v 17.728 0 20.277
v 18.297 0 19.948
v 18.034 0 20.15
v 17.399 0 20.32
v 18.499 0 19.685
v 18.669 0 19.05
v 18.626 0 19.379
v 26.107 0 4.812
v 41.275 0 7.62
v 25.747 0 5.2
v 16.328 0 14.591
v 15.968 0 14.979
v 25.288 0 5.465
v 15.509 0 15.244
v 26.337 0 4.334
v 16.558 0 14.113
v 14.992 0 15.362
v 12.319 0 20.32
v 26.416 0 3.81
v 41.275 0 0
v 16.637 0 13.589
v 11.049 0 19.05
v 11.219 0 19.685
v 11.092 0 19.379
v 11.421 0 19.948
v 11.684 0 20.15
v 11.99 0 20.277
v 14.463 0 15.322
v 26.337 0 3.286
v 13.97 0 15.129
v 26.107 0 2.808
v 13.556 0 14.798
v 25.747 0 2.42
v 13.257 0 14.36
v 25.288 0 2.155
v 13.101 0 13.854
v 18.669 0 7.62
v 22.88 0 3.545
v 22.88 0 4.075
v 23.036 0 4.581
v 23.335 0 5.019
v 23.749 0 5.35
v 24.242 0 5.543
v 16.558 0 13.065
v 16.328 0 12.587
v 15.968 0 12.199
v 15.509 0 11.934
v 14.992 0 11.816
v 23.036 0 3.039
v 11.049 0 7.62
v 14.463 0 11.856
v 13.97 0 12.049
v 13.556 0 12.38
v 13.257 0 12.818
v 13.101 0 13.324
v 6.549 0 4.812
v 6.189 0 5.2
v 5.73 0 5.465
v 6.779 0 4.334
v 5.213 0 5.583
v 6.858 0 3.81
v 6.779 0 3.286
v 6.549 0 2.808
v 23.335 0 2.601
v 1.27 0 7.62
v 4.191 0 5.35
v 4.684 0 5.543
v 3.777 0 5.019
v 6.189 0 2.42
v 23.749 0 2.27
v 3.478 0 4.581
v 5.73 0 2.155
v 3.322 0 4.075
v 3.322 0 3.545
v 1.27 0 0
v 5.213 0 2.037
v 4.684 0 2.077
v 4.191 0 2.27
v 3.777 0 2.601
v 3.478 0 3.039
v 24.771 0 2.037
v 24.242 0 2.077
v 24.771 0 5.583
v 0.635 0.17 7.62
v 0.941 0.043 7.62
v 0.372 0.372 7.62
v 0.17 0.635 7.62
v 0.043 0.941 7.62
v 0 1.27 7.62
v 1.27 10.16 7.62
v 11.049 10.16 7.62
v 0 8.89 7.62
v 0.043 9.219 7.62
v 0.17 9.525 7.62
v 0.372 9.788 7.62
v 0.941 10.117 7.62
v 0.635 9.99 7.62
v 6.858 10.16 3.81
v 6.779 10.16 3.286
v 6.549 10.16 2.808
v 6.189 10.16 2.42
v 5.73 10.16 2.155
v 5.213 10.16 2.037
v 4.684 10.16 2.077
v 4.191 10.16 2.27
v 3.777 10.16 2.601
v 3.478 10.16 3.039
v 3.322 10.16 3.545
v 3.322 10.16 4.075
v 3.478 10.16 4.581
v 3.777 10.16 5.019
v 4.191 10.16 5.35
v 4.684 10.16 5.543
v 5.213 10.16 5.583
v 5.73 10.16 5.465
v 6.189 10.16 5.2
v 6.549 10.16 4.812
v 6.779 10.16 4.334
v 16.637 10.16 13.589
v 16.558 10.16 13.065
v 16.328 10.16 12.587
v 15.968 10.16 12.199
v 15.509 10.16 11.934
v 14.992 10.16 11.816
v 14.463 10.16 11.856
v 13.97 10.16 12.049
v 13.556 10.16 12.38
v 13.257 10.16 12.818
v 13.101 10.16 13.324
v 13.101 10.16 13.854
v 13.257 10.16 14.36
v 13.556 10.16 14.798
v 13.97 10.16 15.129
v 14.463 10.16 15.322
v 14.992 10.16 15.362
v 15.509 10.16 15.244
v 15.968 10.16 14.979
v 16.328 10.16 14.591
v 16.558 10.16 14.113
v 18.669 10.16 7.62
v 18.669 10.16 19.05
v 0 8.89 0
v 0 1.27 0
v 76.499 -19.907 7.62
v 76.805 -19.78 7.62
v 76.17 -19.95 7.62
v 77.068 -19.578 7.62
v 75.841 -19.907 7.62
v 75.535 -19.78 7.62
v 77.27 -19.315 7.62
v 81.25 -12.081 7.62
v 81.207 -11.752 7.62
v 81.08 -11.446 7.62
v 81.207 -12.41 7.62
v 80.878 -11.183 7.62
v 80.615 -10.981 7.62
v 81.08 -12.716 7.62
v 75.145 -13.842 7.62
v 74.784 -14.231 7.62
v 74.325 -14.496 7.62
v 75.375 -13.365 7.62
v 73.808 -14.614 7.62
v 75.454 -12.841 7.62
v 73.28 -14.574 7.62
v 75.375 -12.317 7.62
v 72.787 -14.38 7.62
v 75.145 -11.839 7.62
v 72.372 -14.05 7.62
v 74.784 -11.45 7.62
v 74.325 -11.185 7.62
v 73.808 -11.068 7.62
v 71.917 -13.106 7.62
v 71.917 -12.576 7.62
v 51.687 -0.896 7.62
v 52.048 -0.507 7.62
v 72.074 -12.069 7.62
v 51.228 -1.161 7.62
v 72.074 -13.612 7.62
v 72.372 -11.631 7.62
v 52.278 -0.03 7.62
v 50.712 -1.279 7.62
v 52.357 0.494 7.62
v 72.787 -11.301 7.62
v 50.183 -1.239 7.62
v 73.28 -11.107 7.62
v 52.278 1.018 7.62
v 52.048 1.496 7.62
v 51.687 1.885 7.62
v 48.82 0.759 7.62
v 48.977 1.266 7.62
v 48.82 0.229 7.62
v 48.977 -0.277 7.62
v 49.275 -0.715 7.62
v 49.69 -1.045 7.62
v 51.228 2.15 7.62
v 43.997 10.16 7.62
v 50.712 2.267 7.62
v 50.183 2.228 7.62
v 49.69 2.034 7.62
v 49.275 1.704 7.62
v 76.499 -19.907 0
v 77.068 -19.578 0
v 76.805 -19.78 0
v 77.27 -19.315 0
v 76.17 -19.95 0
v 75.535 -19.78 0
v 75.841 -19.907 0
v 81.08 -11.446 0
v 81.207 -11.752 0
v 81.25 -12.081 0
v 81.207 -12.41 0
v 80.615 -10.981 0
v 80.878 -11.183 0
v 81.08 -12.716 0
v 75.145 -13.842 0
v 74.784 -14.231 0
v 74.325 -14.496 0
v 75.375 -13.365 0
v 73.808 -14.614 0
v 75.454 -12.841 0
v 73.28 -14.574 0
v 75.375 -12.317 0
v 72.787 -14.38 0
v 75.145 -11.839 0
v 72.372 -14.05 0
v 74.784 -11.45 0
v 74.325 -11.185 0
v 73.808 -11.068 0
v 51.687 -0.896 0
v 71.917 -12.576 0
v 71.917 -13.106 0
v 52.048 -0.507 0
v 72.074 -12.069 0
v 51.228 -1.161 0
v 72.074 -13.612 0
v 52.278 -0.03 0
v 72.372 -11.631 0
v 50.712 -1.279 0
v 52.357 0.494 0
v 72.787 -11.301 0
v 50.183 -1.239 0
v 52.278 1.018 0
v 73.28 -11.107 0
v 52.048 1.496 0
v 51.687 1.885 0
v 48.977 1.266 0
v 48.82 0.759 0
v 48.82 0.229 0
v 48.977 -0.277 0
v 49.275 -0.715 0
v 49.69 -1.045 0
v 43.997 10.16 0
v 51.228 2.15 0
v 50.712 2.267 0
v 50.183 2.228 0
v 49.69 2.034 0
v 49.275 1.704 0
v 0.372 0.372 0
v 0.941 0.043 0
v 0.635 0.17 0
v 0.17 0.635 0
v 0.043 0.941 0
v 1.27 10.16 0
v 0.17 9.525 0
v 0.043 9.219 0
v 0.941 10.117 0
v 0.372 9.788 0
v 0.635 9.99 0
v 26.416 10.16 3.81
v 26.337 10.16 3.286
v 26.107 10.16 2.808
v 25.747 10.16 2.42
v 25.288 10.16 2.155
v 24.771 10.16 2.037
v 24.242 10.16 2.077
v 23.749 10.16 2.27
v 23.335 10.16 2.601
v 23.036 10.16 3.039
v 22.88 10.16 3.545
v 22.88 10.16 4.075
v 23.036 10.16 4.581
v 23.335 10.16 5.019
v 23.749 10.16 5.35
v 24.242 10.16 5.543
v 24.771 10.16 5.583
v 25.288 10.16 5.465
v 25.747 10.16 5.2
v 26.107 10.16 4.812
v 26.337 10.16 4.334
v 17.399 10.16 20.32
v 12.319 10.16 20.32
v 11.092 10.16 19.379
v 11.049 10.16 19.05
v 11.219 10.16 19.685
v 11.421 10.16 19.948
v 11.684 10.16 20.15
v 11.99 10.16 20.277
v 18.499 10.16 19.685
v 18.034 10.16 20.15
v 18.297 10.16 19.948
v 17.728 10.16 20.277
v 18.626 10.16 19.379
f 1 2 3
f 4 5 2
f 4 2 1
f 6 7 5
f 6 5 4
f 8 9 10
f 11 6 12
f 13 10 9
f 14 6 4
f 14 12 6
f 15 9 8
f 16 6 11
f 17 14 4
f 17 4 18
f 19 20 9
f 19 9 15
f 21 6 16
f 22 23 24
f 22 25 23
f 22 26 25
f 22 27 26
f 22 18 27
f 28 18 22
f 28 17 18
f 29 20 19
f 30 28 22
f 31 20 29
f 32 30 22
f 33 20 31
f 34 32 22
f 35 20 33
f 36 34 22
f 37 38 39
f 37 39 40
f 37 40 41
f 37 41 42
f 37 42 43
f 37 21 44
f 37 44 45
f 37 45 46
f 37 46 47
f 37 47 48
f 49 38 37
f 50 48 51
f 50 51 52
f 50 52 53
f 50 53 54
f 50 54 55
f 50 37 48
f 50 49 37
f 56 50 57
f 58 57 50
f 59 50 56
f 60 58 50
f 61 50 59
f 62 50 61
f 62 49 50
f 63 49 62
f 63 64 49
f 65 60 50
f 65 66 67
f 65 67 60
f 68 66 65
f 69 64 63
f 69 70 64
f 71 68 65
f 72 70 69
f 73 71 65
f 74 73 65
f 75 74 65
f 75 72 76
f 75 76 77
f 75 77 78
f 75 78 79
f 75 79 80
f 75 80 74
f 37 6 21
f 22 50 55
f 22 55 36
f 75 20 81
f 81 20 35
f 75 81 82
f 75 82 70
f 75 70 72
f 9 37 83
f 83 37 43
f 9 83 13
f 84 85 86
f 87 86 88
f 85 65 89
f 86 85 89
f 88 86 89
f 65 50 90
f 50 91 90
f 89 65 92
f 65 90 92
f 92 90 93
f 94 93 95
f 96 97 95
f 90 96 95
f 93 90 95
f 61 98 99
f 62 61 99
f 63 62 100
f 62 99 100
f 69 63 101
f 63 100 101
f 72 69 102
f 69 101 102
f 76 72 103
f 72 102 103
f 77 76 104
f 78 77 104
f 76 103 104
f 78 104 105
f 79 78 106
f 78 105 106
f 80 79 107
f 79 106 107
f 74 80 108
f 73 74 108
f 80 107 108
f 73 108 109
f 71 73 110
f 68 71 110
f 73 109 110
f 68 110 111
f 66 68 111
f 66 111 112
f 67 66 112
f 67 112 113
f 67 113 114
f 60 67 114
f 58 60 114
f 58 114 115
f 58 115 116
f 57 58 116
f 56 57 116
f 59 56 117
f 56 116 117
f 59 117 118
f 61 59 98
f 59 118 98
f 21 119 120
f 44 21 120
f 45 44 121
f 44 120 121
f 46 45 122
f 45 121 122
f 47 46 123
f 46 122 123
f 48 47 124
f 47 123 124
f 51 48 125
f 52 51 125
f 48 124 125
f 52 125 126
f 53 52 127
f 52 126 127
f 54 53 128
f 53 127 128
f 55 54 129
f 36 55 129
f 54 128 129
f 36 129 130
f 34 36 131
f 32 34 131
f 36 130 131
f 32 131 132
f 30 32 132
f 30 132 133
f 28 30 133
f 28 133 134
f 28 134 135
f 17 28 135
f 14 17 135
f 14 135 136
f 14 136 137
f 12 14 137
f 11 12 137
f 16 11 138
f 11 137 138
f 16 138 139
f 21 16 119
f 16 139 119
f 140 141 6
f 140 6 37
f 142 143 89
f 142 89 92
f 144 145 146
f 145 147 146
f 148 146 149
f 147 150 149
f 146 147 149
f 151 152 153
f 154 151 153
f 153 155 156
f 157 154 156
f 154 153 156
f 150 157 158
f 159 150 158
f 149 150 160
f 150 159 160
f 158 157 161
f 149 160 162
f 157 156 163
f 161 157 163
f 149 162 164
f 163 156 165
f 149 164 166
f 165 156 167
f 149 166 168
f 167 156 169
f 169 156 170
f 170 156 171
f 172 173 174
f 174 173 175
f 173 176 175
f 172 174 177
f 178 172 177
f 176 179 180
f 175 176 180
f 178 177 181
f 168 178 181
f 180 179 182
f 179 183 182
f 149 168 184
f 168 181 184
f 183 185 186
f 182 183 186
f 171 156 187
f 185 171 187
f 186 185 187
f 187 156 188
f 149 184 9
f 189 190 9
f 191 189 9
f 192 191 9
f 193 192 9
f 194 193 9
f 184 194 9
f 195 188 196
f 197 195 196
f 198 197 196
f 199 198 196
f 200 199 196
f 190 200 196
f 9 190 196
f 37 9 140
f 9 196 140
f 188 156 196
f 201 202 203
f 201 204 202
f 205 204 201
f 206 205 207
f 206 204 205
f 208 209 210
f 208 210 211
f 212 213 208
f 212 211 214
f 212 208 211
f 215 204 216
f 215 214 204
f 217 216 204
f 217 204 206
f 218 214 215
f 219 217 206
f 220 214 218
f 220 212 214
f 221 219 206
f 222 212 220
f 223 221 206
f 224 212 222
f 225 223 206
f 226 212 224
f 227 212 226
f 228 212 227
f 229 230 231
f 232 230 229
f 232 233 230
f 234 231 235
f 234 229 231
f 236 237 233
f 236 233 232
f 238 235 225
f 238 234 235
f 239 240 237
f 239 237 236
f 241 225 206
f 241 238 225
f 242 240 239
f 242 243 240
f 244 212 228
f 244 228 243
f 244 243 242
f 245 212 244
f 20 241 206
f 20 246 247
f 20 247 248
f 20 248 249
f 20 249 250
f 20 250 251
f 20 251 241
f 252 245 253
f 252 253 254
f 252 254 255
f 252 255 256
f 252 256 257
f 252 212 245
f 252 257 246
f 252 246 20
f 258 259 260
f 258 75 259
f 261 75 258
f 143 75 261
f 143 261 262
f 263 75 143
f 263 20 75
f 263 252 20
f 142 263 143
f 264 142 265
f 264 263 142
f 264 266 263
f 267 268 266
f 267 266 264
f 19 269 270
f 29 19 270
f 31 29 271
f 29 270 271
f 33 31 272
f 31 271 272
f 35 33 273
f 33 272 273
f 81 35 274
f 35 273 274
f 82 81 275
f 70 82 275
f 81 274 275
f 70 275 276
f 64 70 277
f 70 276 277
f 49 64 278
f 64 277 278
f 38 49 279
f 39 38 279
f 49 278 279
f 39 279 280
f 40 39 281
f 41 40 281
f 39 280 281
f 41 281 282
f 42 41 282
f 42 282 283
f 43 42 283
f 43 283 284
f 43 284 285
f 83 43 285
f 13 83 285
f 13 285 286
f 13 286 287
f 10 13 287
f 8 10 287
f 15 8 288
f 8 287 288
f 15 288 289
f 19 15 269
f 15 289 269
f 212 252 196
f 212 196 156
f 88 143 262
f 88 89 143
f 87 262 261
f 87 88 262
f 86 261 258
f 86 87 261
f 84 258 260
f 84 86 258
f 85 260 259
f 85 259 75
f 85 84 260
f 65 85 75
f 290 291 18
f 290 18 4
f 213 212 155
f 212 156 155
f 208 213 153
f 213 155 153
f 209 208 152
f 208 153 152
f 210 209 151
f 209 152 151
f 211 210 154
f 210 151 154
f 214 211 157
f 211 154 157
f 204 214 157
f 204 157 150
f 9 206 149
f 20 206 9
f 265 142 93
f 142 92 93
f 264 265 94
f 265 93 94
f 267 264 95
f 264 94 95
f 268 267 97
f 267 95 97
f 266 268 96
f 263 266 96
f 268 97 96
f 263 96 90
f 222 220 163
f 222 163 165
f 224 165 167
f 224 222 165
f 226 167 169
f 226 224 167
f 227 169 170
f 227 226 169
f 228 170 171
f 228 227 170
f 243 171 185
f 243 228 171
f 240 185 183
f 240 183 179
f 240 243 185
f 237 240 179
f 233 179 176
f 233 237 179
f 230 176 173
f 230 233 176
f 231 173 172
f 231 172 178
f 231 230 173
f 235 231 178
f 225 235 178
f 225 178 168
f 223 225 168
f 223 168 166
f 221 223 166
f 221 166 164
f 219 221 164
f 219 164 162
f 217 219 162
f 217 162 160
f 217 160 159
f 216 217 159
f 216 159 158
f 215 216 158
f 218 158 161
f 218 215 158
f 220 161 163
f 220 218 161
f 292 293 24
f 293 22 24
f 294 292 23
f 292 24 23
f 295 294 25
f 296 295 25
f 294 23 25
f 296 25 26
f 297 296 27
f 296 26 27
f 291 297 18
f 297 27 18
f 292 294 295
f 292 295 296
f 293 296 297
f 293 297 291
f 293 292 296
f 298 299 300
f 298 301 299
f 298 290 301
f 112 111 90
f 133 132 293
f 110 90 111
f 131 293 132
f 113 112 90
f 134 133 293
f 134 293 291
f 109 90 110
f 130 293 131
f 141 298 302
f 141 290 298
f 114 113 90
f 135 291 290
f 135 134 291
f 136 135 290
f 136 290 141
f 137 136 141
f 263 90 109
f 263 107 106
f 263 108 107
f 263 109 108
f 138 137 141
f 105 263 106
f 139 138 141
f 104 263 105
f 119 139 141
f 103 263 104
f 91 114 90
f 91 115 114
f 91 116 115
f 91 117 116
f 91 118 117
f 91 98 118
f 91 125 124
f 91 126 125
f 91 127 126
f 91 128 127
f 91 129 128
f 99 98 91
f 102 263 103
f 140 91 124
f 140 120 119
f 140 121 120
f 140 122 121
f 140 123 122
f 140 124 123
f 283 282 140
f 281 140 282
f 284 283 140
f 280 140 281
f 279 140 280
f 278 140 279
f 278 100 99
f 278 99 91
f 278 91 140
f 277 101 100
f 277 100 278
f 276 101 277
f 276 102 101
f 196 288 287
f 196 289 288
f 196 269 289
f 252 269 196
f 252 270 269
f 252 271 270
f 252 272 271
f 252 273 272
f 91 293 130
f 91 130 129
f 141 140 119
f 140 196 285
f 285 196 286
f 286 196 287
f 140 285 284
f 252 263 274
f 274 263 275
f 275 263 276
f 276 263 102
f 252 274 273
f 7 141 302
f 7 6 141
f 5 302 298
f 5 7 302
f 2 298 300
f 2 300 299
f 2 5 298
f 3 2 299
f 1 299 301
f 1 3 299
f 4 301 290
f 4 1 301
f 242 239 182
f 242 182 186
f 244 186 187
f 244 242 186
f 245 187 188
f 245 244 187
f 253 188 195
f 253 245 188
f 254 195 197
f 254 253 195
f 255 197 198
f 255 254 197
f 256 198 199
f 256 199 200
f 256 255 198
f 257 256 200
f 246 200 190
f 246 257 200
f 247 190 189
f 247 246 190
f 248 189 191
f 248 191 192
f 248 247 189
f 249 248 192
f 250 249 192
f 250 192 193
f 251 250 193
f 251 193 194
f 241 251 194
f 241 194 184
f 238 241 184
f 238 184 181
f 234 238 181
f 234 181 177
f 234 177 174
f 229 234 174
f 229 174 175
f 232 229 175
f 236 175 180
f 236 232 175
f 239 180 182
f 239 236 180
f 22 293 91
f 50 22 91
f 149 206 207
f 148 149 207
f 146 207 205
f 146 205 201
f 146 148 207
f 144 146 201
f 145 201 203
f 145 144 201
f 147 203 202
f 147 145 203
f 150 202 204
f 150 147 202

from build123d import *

# Parameters (mm, degrees)
SKETCH1_R           = 1.778
BOSS_EXTRUDE1_DEPTH = 7.62
SKETCH2_R           = 1.778
CUT_EXTRUDE1_DEPTH  = 10.16
SKETCH3_W           = 7.62
SKETCH3_H           = 12.7
SKETCH3_R           = 1.778
BOSS_EXTRUDE2_DEPTH = 10.16
FILLET1_R           = 1.27


with BuildPart() as part:
    # Sketch1 → Boss-Extrude1 (new body)
    with BuildSketch(Plane.XY):
        Polygon((0, 0), (0, 10.16), (43.997363795, 10.16), (81.714794759, -11.61616892), (76.634794759, -20.414987023), (41.275, 0), align=None)
        with Locations((50.578635926, 0.494422029)):
            Circle(SKETCH1_R, mode=Mode.SUBTRACT)
        with Locations((73.675533445, -12.840577971)):
            Circle(SKETCH1_R, mode=Mode.SUBTRACT)
    extrude(amount=BOSS_EXTRUDE1_DEPTH)

    # Sketch2 → Cut-Extrude1 (cut)
    with BuildSketch(Plane(origin=(0, 10.16, 0), x_dir=(1, 0, 0), z_dir=(0, 1, 0))):
        with Locations((5.08, -3.81)):
            Circle(SKETCH2_R)
        with Locations((24.638, -3.81)):
            Circle(SKETCH2_R)
    extrude(amount=-CUT_EXTRUDE1_DEPTH, mode=Mode.SUBTRACT)

    # Sketch3 → Boss-Extrude2 (add)
    with BuildSketch(Plane(origin=(0, 10.16, 0), x_dir=(1, 0, 0), z_dir=(0, 1, 0))):
        with Locations((14.859, -13.97)):
            Rectangle(SKETCH3_W, SKETCH3_H)
        with Locations((14.859, -13.589)):
            Circle(SKETCH3_R, mode=Mode.SUBTRACT)
    extrude(amount=-BOSS_EXTRUDE2_DEPTH)

    # Fillet1
    fillet1_edges = [part.edges().sort_by_distance(p)[0] for p in [
        (0, 0, 3.81),
        (0, 10.16, 3.81),
        (81.714794759, -11.61616892, 3.81),
        (76.634794759, -20.414987023, 3.81),
        (11.049, 5.08, 20.32),
        (18.669, 5.08, 20.32),
    ]]
    fillet(fillet1_edges, radius=FILLET1_R)


solid = part.part
